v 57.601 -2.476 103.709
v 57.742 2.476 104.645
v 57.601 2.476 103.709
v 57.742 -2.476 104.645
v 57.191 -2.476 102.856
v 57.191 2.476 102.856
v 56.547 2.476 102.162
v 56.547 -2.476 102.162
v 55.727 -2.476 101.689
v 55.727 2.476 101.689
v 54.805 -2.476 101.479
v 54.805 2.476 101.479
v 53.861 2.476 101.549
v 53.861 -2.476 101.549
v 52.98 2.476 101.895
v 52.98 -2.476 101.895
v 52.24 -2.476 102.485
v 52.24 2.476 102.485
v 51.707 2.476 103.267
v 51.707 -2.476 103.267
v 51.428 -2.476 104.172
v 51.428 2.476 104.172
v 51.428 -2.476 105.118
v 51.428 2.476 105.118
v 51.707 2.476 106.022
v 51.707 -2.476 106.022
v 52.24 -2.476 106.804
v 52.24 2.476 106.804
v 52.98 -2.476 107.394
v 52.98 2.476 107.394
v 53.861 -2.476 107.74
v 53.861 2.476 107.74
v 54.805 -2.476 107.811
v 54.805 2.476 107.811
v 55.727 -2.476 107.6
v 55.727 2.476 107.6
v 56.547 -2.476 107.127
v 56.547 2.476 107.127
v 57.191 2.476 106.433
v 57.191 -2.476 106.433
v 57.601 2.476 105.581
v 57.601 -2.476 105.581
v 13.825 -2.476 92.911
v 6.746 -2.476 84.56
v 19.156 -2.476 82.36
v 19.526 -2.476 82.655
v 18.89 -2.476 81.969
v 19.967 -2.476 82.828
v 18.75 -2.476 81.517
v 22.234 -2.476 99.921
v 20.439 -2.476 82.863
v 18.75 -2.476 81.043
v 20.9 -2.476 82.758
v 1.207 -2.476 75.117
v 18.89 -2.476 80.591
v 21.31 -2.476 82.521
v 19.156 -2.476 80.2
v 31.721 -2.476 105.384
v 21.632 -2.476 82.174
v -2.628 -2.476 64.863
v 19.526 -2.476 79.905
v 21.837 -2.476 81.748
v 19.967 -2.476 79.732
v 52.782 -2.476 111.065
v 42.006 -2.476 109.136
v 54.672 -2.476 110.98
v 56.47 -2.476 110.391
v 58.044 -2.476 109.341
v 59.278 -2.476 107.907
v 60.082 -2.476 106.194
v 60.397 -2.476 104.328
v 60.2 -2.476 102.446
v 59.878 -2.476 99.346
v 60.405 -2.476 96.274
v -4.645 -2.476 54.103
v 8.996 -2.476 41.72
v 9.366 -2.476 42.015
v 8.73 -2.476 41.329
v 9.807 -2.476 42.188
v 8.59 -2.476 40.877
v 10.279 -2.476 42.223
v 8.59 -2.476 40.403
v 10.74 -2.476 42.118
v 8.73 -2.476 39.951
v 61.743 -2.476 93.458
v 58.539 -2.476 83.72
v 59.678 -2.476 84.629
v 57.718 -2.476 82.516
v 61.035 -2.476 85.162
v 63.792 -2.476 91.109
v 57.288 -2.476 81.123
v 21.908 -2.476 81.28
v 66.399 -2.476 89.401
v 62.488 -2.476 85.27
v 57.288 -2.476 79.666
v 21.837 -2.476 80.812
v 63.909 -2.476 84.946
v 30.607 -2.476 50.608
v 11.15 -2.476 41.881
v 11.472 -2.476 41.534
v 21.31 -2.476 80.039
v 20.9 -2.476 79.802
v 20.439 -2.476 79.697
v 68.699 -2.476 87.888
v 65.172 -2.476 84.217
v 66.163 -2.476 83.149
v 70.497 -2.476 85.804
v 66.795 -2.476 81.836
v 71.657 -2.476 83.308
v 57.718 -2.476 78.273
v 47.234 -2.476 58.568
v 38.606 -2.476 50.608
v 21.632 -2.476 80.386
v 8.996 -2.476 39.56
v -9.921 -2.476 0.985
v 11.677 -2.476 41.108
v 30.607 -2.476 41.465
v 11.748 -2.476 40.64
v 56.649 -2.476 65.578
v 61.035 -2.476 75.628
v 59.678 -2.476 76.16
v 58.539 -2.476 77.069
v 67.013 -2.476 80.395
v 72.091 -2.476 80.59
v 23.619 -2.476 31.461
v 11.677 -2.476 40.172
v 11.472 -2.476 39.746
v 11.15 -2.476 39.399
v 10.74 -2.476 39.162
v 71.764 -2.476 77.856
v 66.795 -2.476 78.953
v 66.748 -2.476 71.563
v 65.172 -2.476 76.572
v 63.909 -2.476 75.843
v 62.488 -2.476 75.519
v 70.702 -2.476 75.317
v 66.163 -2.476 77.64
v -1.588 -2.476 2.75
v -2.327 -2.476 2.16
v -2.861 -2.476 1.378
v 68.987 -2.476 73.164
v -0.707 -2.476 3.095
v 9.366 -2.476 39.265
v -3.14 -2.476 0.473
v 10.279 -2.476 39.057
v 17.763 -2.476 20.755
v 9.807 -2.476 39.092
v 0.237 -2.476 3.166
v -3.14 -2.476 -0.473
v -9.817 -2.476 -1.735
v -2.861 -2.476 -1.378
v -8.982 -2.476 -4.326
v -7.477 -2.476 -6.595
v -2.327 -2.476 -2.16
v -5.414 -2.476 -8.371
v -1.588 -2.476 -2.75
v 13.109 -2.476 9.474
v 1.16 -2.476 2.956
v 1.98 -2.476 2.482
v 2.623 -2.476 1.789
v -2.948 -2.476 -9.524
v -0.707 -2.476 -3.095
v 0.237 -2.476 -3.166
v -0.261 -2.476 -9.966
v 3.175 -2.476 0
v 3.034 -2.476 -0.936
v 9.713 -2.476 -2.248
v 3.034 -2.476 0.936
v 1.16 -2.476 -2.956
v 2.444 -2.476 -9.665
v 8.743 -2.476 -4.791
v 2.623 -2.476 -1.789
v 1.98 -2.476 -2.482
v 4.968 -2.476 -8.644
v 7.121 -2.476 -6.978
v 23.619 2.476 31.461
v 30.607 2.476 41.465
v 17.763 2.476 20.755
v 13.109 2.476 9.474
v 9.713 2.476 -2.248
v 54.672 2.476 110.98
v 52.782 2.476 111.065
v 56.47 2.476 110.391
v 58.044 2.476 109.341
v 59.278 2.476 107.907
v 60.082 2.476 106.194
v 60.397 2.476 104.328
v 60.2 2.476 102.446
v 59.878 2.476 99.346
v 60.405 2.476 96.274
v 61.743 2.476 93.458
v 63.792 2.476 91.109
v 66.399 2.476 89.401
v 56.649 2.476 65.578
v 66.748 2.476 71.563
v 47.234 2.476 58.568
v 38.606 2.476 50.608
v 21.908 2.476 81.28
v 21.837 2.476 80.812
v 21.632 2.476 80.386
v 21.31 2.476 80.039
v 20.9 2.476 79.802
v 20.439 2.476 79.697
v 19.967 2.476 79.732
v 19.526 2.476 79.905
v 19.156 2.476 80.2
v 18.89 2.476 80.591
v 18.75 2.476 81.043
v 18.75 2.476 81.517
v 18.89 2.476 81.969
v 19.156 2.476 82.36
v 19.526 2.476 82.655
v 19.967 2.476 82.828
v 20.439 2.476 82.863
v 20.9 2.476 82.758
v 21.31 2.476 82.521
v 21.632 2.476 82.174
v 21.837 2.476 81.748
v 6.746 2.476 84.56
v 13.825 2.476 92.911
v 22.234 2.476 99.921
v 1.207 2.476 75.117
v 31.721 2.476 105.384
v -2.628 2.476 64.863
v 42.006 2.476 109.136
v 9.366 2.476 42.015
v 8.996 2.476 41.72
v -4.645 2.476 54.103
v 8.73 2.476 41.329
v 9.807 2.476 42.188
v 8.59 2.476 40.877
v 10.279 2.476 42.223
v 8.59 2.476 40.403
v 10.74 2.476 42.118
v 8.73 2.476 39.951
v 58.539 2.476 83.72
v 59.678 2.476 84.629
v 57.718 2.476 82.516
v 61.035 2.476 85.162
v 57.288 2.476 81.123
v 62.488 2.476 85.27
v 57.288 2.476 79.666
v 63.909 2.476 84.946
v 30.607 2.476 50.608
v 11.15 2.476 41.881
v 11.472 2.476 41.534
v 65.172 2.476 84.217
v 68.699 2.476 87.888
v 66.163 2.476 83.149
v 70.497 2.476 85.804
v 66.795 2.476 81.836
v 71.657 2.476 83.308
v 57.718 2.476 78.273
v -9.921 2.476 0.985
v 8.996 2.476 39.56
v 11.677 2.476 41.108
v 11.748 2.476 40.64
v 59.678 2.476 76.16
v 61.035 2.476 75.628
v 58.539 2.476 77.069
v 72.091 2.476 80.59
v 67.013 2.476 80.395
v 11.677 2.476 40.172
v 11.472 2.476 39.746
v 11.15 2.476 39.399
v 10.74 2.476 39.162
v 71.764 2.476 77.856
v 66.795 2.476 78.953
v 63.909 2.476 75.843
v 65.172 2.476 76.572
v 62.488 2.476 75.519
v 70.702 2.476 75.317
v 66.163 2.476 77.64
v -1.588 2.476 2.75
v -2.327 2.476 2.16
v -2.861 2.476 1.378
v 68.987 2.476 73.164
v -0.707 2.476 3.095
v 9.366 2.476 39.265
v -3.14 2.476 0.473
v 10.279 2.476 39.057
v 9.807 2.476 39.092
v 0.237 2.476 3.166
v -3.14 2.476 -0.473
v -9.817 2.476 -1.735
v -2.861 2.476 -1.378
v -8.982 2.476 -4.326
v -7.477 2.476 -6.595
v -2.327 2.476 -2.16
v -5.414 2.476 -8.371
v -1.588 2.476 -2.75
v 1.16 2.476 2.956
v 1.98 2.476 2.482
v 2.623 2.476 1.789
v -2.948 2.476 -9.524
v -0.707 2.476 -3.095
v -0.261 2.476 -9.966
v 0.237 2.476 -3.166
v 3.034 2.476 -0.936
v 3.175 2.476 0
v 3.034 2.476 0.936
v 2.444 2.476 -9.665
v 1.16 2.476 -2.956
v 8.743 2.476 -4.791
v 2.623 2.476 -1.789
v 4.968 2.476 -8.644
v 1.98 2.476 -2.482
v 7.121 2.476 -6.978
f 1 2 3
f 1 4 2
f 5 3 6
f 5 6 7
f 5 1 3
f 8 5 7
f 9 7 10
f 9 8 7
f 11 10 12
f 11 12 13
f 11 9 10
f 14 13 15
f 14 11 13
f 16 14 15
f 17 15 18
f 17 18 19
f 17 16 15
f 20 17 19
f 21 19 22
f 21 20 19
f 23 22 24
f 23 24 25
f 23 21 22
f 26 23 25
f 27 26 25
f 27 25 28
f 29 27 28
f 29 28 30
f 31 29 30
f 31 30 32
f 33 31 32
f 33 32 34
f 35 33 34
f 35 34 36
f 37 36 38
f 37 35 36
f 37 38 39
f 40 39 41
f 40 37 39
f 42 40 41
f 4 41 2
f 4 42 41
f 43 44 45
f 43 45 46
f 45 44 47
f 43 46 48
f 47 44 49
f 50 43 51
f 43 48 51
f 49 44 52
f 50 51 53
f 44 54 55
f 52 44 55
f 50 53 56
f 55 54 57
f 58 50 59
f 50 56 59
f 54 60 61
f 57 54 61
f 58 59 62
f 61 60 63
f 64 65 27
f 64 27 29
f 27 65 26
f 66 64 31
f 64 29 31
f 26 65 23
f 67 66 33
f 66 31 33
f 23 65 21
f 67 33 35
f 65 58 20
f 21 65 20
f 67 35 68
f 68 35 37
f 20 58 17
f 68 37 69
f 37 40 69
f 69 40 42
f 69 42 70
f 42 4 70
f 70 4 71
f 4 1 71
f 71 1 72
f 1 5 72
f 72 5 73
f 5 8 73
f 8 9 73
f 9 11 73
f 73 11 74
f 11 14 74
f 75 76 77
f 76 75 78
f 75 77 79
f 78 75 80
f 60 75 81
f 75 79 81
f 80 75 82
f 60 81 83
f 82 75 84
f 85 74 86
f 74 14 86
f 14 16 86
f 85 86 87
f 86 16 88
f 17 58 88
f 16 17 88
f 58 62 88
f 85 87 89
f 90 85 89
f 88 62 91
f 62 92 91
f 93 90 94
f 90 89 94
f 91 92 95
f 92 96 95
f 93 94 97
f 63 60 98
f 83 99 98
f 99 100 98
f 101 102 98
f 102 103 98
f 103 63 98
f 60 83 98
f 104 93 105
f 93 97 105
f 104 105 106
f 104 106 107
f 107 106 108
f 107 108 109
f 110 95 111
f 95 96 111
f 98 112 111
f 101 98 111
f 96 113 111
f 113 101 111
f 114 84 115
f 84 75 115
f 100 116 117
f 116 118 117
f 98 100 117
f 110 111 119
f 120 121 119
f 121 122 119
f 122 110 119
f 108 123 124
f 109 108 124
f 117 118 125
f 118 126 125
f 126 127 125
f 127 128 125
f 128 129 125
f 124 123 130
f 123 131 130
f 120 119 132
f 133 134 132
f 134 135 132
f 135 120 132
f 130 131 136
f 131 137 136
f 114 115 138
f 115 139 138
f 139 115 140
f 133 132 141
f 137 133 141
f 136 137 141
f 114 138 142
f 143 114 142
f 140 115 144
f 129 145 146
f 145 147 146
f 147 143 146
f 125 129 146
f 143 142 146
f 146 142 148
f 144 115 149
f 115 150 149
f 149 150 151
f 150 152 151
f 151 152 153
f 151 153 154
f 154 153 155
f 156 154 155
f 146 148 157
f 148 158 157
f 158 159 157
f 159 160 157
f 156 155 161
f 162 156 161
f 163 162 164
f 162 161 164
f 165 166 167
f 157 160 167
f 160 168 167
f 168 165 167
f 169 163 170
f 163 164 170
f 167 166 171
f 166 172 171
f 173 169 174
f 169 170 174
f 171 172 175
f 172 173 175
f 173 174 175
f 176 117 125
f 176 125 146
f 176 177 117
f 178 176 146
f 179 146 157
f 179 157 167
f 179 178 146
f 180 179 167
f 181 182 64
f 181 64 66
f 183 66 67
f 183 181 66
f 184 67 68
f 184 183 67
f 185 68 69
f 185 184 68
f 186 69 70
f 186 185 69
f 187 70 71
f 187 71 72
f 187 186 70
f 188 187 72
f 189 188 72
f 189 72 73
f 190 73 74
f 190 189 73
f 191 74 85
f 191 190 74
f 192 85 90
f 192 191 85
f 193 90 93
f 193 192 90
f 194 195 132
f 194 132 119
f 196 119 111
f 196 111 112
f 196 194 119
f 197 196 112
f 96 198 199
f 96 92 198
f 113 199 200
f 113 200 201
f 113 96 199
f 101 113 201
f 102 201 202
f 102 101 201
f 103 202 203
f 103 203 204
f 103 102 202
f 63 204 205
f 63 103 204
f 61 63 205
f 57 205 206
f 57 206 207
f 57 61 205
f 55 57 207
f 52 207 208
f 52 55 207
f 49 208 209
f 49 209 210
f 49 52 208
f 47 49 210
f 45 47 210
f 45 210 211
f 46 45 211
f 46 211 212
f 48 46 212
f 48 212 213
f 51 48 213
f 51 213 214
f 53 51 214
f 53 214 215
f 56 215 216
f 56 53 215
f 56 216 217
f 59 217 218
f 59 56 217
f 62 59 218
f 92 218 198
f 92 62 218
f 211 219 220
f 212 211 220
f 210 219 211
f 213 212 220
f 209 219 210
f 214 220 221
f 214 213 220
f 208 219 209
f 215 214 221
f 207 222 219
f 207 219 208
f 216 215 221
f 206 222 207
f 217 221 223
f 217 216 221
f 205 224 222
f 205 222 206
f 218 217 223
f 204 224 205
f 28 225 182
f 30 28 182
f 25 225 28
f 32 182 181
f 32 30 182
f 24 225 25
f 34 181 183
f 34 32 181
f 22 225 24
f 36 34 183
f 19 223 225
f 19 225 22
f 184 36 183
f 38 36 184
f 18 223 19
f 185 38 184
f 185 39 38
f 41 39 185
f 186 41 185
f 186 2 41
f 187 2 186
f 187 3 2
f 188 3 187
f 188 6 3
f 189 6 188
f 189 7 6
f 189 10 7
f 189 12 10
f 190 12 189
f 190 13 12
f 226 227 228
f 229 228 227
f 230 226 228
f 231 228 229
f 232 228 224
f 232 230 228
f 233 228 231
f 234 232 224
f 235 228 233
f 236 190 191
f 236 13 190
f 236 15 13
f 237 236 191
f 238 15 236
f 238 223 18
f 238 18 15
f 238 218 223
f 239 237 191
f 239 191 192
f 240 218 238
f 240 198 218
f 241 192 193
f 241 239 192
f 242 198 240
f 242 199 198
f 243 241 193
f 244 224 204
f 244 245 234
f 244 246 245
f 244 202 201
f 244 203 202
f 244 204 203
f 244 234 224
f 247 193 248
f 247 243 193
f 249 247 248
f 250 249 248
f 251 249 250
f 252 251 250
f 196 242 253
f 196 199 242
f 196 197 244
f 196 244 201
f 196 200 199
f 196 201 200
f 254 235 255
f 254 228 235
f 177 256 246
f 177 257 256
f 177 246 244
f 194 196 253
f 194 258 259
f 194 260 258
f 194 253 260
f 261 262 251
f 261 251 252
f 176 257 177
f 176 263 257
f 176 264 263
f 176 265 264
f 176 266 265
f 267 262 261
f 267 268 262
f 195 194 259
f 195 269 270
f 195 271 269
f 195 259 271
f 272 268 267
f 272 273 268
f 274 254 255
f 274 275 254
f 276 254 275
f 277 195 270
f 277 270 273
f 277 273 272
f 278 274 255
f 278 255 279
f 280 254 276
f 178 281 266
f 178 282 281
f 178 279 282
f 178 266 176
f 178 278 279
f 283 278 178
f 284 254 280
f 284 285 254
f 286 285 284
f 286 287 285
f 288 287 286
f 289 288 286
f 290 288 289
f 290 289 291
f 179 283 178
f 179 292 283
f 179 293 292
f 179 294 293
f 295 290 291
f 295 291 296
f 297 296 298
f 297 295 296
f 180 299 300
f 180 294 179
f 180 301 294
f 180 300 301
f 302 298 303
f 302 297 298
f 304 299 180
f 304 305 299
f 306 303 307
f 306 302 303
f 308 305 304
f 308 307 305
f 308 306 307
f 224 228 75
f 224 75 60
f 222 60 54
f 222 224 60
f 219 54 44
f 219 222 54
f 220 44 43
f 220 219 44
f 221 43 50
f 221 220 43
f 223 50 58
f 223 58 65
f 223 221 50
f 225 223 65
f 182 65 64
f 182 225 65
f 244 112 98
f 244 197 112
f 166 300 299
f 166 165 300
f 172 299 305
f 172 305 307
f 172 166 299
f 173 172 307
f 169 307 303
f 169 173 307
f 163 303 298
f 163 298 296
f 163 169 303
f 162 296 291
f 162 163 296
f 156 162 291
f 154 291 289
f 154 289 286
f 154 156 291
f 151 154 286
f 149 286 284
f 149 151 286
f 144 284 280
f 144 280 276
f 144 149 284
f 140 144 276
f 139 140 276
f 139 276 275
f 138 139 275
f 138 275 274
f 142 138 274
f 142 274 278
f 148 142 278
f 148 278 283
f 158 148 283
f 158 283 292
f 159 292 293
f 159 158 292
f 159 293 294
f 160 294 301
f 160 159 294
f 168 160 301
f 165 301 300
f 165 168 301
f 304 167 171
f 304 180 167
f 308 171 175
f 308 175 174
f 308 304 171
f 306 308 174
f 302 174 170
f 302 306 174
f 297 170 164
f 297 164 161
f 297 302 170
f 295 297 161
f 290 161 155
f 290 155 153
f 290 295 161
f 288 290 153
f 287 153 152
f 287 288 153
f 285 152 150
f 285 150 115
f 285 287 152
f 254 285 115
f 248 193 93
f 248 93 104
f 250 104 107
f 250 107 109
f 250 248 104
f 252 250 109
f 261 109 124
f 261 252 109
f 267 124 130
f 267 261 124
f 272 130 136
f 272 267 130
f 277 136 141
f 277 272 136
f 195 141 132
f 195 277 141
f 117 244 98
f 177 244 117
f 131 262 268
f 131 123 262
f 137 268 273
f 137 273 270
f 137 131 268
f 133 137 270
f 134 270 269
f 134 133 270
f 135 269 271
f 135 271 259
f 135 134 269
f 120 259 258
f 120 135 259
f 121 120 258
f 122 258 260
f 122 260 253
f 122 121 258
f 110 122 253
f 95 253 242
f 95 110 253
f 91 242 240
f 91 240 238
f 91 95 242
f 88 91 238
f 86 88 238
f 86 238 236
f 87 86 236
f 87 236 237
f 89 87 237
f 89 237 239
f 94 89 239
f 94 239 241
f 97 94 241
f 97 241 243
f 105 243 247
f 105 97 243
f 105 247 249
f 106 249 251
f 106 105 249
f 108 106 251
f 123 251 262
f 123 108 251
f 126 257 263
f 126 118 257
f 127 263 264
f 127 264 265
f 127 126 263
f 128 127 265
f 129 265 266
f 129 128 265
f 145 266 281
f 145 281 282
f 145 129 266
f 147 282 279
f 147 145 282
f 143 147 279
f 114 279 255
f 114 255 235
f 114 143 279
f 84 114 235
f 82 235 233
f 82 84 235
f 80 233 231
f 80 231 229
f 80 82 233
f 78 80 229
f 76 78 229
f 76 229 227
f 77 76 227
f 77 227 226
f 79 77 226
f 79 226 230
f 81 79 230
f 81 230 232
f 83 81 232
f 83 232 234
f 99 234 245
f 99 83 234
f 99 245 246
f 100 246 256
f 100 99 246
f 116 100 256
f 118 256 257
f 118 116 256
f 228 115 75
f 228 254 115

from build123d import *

# Parameters (mm, degrees)
SKETCH1_R           = 3.175
SKETCH1_R_2         = 4.8895
SKETCH1_R_3         = 1.5875
BOSS_EXTRUDE1_DEPTH = 2.4765


with BuildPart() as part:
    # Sketch1 → Boss-Extrude1 (new, symmetric)
    with BuildSketch(Plane(origin=(0, 0, 0), x_dir=(1, 0, 0), z_dir=(0, 1, 0))):
        with BuildLine():
            Line((-9.920693981, -0.985272137), (-4.645338625, -54.102765436))
            ThreePointArc((-4.645338625, -54.102765436), (13.82535886, -92.910530232), (52.781966192, -111.065199582))
            ThreePointArc((52.781966192, -111.065199582), (58.709905634, -108.665583198), (60.200009938, -102.446402065))
            ThreePointArc((60.200009938, -102.446402065), (60.977721367, -94.820202541), (66.399042003, -89.400512808))
            ThreePointArc((66.399042003, -89.400512808), (72.090603236, -80.589631254), (66.74806575, -71.56284909))
            ThreePointArc((66.74806575, -71.56284909), (51.849457493, -62.196647711), (38.60581081, -50.607856626))
            Line((38.60581081, -50.607856626), (30.607, -50.607856626))
            Line((30.607, -50.607856626), (30.607, -41.464916232))
            ThreePointArc((30.607, -41.464916232), (17.762693232, -20.754549727), (9.712854703, 2.24752837))
            ThreePointArc((9.712854703, 2.24752837), (-1.619737346, 9.837041282), (-9.920693981, -0.985272137))
        make_face()
        Circle(SKETCH1_R, mode=Mode.SUBTRACT)
        with Locations((62.123011123, -80.394598631)):
            Circle(SKETCH1_R_2, mode=Mode.SUBTRACT)
        with Locations((54.567235003, -104.644758367)):
            Circle(SKETCH1_R, mode=Mode.SUBTRACT)
        with Locations((10.16, -40.64)):
            Circle(SKETCH1_R_3, mode=Mode.SUBTRACT)
        with Locations((20.32, -81.28)):
            Circle(SKETCH1_R_3, mode=Mode.SUBTRACT)
    extrude(amount=BOSS_EXTRUDE1_DEPTH, both=True)


solid = part.part
